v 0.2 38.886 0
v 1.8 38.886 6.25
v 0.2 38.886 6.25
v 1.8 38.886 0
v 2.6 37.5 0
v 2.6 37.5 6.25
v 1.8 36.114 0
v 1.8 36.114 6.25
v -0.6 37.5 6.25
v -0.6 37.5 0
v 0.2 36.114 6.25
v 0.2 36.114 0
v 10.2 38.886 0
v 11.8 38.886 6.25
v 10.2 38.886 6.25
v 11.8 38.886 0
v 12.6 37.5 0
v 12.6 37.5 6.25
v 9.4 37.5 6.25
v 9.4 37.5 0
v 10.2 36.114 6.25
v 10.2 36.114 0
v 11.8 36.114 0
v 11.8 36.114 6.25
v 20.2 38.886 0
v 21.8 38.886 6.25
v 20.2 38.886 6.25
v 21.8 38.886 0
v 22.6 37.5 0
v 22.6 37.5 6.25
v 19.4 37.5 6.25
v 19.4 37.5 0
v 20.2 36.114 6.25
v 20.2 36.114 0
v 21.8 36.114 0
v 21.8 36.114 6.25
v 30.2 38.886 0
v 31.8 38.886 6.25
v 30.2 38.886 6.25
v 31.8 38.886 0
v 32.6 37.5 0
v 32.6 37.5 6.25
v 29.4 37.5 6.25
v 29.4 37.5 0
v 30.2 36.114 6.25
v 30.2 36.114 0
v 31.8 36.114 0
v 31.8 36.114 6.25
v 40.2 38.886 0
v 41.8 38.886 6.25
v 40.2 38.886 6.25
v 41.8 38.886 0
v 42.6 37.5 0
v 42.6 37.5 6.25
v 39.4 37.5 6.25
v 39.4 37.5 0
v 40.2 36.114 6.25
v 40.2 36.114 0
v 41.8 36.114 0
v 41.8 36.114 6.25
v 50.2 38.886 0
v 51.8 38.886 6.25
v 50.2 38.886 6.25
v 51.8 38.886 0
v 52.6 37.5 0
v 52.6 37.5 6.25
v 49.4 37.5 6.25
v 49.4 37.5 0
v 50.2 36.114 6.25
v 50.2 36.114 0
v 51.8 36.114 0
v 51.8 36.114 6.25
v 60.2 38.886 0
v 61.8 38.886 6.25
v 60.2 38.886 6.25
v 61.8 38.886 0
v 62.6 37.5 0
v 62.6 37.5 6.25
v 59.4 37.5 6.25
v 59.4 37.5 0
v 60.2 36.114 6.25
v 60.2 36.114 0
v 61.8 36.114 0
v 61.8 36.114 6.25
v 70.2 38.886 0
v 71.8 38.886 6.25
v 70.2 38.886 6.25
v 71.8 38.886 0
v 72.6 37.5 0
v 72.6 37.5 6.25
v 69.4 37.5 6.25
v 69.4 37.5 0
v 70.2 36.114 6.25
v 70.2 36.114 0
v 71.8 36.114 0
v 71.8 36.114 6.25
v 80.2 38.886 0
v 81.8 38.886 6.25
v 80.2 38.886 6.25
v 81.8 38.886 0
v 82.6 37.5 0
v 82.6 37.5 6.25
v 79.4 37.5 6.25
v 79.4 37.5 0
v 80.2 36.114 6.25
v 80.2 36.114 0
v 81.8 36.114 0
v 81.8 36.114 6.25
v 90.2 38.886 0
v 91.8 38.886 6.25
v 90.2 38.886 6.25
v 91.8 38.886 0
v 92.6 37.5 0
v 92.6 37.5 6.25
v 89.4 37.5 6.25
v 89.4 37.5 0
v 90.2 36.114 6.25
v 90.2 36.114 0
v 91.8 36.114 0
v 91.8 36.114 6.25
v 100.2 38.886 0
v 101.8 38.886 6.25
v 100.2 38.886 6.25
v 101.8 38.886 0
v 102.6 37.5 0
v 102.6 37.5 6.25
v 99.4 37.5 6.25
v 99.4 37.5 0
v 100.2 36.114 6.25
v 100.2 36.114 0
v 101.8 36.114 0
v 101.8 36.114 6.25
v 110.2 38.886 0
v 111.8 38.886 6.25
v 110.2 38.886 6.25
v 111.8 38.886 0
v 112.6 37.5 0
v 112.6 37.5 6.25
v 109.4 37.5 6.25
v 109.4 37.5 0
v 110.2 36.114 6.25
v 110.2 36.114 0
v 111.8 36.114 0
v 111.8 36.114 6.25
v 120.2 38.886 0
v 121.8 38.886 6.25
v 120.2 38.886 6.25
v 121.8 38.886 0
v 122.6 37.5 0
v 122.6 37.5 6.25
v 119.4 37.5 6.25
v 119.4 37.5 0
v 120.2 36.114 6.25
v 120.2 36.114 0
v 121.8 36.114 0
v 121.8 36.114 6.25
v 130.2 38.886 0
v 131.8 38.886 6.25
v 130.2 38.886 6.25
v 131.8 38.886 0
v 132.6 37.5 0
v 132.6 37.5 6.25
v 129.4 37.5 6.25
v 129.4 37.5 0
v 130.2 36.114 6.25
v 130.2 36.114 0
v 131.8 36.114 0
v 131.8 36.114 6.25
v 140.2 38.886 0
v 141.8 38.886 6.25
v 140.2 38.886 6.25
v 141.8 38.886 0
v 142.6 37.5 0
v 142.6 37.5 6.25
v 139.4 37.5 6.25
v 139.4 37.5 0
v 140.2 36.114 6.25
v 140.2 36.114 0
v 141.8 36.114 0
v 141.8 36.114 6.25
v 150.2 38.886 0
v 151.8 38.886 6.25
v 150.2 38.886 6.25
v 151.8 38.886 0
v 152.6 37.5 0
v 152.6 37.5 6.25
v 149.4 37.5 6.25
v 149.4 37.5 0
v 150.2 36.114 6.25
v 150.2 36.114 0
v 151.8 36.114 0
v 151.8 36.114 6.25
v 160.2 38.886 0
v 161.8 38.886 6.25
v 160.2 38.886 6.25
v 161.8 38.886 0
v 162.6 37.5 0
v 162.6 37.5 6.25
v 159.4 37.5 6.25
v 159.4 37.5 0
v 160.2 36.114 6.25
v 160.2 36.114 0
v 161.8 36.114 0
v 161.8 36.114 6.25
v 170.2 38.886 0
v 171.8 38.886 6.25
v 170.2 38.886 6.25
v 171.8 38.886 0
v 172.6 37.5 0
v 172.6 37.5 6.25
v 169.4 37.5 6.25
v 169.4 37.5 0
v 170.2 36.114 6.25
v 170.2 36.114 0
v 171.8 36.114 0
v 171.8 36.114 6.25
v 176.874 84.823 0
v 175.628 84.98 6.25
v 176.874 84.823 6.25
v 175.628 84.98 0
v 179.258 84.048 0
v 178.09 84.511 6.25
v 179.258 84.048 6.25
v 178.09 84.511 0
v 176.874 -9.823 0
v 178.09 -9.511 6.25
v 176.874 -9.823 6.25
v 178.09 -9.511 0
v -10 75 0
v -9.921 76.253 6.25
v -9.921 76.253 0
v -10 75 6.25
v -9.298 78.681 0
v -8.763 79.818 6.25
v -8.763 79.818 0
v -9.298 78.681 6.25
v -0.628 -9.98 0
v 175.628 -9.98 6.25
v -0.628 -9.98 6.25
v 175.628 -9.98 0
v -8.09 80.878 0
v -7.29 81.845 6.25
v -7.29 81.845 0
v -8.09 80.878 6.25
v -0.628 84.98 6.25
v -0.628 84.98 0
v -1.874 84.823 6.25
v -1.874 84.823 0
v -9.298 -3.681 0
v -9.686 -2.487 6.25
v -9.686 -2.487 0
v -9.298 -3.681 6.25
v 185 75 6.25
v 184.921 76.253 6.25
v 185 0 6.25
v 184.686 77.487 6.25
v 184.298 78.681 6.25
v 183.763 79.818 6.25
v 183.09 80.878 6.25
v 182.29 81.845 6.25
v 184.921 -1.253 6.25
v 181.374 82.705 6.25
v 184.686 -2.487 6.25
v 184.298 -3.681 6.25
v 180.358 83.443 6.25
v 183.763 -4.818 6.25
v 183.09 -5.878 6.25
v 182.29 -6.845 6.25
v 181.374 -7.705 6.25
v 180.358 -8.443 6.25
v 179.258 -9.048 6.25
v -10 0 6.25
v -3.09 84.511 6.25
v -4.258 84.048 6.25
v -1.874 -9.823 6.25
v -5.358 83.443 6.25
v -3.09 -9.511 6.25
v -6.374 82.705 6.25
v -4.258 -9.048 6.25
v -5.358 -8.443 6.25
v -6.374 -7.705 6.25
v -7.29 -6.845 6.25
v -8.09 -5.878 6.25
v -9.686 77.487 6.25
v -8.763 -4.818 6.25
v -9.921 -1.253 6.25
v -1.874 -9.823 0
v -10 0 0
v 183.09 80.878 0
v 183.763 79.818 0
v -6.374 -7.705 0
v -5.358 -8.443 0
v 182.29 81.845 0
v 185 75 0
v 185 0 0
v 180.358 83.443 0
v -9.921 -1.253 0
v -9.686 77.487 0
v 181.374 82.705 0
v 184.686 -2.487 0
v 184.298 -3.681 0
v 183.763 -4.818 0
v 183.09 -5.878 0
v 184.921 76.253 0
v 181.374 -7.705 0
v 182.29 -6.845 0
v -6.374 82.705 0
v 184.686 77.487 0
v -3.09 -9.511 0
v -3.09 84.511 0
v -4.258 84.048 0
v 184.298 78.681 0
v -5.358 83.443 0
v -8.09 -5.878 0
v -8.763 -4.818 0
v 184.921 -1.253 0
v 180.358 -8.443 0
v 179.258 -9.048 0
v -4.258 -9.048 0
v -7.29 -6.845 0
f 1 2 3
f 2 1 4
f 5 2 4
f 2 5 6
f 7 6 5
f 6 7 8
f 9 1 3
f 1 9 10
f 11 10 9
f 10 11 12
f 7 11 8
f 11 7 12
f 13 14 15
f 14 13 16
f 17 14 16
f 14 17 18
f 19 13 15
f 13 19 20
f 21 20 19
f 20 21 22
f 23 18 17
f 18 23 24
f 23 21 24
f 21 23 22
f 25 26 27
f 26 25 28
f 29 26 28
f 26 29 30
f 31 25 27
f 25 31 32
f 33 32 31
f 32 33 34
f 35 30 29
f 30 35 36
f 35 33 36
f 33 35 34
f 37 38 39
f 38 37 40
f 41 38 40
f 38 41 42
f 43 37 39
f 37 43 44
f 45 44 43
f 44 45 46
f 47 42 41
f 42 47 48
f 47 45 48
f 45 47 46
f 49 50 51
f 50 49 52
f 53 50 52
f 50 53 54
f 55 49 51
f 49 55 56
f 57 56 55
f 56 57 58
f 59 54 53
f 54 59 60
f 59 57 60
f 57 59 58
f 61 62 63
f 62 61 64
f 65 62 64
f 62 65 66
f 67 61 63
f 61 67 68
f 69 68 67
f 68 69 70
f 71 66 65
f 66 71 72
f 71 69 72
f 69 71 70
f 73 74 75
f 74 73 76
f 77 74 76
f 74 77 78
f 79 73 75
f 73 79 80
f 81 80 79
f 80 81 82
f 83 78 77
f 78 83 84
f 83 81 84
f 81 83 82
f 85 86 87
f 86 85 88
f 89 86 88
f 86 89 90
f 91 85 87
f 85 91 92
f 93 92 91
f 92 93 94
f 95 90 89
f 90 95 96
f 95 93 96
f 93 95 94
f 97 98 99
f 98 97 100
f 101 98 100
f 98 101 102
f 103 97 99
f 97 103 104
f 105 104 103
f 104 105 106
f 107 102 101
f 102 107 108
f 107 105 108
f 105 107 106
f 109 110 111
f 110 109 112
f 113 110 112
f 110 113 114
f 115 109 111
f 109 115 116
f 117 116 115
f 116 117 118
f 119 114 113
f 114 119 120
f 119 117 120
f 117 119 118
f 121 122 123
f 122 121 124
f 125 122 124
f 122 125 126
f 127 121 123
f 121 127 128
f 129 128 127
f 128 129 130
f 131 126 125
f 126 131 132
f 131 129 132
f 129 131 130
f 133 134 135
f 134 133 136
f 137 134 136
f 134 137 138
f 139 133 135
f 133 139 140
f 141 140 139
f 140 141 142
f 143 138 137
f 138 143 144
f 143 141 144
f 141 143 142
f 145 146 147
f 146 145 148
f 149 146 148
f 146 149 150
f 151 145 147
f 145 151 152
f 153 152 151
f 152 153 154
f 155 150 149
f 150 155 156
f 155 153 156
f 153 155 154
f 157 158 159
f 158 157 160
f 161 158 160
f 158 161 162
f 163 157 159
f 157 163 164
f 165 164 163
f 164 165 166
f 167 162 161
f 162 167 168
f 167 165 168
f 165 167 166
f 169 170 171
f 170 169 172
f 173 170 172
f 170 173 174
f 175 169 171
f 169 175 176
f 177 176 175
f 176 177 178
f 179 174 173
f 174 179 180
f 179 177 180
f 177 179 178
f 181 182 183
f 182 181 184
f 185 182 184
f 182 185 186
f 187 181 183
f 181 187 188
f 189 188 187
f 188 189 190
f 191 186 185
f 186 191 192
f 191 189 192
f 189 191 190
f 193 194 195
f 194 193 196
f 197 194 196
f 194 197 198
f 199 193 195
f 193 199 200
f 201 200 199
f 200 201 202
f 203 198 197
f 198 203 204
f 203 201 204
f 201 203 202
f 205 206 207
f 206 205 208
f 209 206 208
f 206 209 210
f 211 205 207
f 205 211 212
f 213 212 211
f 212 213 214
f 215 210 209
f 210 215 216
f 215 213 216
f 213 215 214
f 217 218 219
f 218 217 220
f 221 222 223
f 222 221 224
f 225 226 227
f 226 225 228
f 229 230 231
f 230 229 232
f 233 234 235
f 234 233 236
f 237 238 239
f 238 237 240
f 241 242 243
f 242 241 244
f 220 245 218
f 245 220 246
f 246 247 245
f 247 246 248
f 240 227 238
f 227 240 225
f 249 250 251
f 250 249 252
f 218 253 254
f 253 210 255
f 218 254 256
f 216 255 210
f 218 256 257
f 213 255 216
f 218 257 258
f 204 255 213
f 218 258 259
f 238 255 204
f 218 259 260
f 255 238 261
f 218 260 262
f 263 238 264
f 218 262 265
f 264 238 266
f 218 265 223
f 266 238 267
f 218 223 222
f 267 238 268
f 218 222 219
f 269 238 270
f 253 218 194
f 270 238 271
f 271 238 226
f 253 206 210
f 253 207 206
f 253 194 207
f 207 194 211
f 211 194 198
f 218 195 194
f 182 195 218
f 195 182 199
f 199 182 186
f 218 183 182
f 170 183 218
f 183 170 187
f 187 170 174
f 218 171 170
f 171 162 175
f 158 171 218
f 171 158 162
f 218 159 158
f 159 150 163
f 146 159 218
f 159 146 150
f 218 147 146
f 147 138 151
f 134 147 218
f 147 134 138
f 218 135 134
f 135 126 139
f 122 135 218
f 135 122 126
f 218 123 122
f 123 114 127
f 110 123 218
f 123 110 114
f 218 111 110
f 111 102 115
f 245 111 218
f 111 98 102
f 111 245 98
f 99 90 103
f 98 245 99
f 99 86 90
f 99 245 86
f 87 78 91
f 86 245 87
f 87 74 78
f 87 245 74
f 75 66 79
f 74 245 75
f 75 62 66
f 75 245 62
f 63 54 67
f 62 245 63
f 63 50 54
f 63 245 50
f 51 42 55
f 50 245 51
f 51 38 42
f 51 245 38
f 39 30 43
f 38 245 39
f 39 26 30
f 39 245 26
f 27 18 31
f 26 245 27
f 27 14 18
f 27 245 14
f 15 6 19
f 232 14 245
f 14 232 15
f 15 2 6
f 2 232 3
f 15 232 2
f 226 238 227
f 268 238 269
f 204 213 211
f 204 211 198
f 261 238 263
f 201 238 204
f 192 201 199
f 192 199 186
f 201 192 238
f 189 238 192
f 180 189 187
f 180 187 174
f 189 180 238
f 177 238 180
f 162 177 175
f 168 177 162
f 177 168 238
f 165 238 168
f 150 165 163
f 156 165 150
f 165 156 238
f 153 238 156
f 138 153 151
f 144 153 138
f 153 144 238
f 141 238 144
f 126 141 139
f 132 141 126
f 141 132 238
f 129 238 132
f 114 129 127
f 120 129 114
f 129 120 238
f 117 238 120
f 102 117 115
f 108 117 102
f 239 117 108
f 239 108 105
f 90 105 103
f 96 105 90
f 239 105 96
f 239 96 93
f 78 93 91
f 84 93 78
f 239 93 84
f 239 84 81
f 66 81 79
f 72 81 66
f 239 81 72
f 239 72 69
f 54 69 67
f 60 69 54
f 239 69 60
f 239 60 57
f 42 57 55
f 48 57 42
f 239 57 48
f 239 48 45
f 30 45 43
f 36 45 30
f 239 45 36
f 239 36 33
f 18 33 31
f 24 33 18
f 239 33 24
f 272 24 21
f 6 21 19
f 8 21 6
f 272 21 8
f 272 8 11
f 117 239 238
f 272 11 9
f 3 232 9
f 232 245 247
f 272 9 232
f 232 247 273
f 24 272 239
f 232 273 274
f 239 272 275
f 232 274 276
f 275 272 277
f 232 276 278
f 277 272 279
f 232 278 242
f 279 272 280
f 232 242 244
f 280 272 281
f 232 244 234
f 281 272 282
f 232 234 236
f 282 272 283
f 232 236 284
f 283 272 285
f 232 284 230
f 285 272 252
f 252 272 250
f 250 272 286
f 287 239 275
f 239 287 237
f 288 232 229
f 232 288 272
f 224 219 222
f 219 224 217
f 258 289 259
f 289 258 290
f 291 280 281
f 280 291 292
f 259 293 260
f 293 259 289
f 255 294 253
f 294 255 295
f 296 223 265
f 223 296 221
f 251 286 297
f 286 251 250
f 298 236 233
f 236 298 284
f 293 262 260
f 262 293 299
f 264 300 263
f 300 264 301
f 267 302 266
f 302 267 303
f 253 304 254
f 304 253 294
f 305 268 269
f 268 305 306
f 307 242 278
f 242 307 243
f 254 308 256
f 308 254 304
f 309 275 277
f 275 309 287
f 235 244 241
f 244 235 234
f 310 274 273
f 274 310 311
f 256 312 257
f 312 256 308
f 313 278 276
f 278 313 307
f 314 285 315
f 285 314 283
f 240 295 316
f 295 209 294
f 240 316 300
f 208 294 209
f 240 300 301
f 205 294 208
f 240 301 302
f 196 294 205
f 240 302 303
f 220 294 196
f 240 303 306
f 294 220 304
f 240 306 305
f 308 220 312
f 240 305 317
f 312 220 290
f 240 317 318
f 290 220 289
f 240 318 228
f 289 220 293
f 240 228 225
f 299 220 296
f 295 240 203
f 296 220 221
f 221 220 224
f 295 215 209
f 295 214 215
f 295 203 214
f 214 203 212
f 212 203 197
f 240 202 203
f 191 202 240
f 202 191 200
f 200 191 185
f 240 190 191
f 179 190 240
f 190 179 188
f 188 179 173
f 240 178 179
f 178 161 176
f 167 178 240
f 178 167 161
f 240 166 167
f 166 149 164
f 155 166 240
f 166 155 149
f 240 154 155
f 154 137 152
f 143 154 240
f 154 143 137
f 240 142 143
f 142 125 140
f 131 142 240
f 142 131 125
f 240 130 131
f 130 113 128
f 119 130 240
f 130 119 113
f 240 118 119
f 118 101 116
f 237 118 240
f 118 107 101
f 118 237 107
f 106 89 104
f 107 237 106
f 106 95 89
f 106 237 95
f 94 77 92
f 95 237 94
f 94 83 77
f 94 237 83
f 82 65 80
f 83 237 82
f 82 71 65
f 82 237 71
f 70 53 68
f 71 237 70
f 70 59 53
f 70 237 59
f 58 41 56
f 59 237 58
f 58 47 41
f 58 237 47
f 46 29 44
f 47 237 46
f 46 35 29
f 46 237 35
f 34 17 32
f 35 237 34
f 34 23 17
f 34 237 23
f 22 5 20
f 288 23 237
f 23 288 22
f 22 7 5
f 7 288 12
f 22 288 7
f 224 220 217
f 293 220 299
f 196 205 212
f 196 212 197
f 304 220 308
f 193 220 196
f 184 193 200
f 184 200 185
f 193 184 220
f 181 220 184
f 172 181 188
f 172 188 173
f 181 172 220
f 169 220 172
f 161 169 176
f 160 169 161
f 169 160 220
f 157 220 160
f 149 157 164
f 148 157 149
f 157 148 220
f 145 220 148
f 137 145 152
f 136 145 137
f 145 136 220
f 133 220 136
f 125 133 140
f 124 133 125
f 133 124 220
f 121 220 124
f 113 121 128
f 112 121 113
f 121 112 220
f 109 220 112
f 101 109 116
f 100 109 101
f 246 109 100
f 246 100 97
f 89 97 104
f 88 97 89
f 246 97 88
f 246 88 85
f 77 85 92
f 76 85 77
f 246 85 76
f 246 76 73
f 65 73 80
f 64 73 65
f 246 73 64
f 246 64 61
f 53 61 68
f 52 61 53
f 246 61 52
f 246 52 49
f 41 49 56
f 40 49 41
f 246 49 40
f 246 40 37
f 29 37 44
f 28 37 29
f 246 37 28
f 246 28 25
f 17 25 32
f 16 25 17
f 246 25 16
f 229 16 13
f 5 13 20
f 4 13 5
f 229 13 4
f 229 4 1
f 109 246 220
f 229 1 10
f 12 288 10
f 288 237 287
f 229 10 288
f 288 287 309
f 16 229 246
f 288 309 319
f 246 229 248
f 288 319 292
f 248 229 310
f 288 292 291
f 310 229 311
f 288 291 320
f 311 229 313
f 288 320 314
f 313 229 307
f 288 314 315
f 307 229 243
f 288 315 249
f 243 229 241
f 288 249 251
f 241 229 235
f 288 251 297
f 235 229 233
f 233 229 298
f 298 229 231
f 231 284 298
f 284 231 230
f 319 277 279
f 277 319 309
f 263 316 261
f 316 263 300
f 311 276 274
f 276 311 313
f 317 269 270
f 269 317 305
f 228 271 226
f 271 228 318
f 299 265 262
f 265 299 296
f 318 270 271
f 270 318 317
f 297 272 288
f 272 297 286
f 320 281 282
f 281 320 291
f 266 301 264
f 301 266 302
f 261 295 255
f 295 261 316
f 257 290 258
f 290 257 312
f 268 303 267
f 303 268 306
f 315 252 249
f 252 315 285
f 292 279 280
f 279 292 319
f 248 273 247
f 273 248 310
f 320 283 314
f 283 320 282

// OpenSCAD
dc_len=195;
dc_width=95;
dc_height=5;
rounding=10;


module donkeycarplate(){
    $fn=50;
    minkowski()
    {
        cube([dc_len-(2*rounding),dc_width-(2*rounding),dc_height]);
        cylinder(r=rounding,h=dc_height/4);
    }
}

module hole(x,y){
    hole_radius=1.6;
    translate([x,y,-1]) cylinder(h=3*dc_height,r=hole_radius);
}

difference(){
donkeycarplate();
        for (i=[0.1*rounding:10:dc_len-(2*rounding)]){
            hole(i,dc_width/2-rounding);
        }
};
